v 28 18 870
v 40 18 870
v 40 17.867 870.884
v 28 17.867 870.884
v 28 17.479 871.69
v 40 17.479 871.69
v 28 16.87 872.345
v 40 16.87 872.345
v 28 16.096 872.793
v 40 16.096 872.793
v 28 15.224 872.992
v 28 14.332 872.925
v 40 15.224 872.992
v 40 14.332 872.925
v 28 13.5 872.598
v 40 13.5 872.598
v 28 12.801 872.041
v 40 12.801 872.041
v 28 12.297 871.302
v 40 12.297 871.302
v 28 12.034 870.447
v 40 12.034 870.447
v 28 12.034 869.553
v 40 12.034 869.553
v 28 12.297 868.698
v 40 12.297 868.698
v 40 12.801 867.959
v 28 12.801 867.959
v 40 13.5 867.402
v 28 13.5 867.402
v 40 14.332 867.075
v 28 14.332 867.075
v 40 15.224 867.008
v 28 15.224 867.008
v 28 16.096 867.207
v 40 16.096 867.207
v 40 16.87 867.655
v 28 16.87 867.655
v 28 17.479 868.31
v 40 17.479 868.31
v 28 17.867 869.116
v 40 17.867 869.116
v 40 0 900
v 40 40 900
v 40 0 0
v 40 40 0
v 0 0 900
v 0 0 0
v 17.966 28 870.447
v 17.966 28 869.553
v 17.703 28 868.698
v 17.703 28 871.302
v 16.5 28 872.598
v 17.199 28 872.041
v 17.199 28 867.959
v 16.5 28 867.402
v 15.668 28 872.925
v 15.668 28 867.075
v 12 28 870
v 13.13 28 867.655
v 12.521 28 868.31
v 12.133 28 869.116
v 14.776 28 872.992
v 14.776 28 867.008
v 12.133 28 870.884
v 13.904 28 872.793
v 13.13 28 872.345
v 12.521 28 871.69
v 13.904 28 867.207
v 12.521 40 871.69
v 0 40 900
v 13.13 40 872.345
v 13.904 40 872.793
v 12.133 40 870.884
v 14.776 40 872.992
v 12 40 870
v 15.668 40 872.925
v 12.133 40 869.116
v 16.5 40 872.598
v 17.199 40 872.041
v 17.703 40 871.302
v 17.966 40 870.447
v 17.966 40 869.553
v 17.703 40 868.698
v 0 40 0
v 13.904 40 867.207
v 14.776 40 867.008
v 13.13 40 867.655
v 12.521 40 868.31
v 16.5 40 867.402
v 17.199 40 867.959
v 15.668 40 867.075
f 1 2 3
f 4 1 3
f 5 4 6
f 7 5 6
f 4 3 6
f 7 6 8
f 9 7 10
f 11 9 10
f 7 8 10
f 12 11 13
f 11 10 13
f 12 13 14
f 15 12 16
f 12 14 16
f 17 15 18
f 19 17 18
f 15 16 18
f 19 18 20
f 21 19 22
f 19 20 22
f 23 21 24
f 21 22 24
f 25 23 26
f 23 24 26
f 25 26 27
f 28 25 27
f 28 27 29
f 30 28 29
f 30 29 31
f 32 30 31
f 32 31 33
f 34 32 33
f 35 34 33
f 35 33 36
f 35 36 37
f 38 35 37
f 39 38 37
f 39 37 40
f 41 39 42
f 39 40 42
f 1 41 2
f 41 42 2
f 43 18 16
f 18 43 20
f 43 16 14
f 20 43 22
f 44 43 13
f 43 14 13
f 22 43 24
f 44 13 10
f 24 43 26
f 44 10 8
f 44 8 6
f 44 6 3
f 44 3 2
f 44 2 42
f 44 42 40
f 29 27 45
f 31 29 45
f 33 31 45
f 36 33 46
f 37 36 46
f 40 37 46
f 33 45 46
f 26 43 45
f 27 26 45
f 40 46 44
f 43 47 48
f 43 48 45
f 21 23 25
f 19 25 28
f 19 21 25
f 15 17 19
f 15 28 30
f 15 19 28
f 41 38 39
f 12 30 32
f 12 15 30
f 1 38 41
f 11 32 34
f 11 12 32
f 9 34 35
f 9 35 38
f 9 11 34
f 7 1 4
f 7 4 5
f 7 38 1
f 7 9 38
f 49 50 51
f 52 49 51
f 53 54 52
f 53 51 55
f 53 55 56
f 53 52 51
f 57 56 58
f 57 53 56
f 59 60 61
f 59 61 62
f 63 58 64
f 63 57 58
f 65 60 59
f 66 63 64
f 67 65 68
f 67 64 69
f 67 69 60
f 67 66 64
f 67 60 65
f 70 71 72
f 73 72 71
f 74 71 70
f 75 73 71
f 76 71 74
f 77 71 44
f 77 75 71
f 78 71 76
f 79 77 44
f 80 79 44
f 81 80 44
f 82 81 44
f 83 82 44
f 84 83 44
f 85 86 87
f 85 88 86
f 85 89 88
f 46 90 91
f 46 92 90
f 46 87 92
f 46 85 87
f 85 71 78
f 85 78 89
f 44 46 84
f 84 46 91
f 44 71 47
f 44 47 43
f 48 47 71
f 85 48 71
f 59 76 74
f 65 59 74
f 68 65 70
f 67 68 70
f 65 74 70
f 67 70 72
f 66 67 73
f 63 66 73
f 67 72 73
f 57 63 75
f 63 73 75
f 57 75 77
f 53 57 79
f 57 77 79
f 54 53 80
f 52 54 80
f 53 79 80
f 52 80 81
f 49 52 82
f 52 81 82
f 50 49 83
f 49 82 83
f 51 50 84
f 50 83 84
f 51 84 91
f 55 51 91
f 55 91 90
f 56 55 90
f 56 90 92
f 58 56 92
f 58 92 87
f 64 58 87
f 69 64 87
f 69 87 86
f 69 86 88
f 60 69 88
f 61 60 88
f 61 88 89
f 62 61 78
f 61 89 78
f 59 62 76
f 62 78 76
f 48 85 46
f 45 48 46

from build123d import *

# Parameters (mm, degrees)
F0_W     = 40
F0_H     = 40
F1_DEPTH = 900
F2_R     = 3
F3_DEPTH = 12
F4_R     = 3
F5_DEPTH = 12


with BuildPart() as f1:
    # F0 (on Top) → F1 (new body)
    with BuildSketch(Plane.XY):
        with Locations((20, 20)):
            Rectangle(F0_W, F0_H)
    extrude(amount=F1_DEPTH)

    # F2 (on face) → F3 (cut)
    with BuildSketch(Plane.YZ.offset(40)):
        with Locations((15, 870)):
            Circle(F2_R)
    extrude(amount=-F3_DEPTH, mode=Mode.SUBTRACT)

    # F4 (on face) → F5 (cut)
    with BuildSketch(Plane(origin=(0, 40, 0), x_dir=(-1, 0, 0), z_dir=(0, 1, 0))):
        with Locations((-15, 870)):
            Circle(F4_R)
    extrude(amount=-F5_DEPTH, mode=Mode.SUBTRACT)


solid = f1.part
